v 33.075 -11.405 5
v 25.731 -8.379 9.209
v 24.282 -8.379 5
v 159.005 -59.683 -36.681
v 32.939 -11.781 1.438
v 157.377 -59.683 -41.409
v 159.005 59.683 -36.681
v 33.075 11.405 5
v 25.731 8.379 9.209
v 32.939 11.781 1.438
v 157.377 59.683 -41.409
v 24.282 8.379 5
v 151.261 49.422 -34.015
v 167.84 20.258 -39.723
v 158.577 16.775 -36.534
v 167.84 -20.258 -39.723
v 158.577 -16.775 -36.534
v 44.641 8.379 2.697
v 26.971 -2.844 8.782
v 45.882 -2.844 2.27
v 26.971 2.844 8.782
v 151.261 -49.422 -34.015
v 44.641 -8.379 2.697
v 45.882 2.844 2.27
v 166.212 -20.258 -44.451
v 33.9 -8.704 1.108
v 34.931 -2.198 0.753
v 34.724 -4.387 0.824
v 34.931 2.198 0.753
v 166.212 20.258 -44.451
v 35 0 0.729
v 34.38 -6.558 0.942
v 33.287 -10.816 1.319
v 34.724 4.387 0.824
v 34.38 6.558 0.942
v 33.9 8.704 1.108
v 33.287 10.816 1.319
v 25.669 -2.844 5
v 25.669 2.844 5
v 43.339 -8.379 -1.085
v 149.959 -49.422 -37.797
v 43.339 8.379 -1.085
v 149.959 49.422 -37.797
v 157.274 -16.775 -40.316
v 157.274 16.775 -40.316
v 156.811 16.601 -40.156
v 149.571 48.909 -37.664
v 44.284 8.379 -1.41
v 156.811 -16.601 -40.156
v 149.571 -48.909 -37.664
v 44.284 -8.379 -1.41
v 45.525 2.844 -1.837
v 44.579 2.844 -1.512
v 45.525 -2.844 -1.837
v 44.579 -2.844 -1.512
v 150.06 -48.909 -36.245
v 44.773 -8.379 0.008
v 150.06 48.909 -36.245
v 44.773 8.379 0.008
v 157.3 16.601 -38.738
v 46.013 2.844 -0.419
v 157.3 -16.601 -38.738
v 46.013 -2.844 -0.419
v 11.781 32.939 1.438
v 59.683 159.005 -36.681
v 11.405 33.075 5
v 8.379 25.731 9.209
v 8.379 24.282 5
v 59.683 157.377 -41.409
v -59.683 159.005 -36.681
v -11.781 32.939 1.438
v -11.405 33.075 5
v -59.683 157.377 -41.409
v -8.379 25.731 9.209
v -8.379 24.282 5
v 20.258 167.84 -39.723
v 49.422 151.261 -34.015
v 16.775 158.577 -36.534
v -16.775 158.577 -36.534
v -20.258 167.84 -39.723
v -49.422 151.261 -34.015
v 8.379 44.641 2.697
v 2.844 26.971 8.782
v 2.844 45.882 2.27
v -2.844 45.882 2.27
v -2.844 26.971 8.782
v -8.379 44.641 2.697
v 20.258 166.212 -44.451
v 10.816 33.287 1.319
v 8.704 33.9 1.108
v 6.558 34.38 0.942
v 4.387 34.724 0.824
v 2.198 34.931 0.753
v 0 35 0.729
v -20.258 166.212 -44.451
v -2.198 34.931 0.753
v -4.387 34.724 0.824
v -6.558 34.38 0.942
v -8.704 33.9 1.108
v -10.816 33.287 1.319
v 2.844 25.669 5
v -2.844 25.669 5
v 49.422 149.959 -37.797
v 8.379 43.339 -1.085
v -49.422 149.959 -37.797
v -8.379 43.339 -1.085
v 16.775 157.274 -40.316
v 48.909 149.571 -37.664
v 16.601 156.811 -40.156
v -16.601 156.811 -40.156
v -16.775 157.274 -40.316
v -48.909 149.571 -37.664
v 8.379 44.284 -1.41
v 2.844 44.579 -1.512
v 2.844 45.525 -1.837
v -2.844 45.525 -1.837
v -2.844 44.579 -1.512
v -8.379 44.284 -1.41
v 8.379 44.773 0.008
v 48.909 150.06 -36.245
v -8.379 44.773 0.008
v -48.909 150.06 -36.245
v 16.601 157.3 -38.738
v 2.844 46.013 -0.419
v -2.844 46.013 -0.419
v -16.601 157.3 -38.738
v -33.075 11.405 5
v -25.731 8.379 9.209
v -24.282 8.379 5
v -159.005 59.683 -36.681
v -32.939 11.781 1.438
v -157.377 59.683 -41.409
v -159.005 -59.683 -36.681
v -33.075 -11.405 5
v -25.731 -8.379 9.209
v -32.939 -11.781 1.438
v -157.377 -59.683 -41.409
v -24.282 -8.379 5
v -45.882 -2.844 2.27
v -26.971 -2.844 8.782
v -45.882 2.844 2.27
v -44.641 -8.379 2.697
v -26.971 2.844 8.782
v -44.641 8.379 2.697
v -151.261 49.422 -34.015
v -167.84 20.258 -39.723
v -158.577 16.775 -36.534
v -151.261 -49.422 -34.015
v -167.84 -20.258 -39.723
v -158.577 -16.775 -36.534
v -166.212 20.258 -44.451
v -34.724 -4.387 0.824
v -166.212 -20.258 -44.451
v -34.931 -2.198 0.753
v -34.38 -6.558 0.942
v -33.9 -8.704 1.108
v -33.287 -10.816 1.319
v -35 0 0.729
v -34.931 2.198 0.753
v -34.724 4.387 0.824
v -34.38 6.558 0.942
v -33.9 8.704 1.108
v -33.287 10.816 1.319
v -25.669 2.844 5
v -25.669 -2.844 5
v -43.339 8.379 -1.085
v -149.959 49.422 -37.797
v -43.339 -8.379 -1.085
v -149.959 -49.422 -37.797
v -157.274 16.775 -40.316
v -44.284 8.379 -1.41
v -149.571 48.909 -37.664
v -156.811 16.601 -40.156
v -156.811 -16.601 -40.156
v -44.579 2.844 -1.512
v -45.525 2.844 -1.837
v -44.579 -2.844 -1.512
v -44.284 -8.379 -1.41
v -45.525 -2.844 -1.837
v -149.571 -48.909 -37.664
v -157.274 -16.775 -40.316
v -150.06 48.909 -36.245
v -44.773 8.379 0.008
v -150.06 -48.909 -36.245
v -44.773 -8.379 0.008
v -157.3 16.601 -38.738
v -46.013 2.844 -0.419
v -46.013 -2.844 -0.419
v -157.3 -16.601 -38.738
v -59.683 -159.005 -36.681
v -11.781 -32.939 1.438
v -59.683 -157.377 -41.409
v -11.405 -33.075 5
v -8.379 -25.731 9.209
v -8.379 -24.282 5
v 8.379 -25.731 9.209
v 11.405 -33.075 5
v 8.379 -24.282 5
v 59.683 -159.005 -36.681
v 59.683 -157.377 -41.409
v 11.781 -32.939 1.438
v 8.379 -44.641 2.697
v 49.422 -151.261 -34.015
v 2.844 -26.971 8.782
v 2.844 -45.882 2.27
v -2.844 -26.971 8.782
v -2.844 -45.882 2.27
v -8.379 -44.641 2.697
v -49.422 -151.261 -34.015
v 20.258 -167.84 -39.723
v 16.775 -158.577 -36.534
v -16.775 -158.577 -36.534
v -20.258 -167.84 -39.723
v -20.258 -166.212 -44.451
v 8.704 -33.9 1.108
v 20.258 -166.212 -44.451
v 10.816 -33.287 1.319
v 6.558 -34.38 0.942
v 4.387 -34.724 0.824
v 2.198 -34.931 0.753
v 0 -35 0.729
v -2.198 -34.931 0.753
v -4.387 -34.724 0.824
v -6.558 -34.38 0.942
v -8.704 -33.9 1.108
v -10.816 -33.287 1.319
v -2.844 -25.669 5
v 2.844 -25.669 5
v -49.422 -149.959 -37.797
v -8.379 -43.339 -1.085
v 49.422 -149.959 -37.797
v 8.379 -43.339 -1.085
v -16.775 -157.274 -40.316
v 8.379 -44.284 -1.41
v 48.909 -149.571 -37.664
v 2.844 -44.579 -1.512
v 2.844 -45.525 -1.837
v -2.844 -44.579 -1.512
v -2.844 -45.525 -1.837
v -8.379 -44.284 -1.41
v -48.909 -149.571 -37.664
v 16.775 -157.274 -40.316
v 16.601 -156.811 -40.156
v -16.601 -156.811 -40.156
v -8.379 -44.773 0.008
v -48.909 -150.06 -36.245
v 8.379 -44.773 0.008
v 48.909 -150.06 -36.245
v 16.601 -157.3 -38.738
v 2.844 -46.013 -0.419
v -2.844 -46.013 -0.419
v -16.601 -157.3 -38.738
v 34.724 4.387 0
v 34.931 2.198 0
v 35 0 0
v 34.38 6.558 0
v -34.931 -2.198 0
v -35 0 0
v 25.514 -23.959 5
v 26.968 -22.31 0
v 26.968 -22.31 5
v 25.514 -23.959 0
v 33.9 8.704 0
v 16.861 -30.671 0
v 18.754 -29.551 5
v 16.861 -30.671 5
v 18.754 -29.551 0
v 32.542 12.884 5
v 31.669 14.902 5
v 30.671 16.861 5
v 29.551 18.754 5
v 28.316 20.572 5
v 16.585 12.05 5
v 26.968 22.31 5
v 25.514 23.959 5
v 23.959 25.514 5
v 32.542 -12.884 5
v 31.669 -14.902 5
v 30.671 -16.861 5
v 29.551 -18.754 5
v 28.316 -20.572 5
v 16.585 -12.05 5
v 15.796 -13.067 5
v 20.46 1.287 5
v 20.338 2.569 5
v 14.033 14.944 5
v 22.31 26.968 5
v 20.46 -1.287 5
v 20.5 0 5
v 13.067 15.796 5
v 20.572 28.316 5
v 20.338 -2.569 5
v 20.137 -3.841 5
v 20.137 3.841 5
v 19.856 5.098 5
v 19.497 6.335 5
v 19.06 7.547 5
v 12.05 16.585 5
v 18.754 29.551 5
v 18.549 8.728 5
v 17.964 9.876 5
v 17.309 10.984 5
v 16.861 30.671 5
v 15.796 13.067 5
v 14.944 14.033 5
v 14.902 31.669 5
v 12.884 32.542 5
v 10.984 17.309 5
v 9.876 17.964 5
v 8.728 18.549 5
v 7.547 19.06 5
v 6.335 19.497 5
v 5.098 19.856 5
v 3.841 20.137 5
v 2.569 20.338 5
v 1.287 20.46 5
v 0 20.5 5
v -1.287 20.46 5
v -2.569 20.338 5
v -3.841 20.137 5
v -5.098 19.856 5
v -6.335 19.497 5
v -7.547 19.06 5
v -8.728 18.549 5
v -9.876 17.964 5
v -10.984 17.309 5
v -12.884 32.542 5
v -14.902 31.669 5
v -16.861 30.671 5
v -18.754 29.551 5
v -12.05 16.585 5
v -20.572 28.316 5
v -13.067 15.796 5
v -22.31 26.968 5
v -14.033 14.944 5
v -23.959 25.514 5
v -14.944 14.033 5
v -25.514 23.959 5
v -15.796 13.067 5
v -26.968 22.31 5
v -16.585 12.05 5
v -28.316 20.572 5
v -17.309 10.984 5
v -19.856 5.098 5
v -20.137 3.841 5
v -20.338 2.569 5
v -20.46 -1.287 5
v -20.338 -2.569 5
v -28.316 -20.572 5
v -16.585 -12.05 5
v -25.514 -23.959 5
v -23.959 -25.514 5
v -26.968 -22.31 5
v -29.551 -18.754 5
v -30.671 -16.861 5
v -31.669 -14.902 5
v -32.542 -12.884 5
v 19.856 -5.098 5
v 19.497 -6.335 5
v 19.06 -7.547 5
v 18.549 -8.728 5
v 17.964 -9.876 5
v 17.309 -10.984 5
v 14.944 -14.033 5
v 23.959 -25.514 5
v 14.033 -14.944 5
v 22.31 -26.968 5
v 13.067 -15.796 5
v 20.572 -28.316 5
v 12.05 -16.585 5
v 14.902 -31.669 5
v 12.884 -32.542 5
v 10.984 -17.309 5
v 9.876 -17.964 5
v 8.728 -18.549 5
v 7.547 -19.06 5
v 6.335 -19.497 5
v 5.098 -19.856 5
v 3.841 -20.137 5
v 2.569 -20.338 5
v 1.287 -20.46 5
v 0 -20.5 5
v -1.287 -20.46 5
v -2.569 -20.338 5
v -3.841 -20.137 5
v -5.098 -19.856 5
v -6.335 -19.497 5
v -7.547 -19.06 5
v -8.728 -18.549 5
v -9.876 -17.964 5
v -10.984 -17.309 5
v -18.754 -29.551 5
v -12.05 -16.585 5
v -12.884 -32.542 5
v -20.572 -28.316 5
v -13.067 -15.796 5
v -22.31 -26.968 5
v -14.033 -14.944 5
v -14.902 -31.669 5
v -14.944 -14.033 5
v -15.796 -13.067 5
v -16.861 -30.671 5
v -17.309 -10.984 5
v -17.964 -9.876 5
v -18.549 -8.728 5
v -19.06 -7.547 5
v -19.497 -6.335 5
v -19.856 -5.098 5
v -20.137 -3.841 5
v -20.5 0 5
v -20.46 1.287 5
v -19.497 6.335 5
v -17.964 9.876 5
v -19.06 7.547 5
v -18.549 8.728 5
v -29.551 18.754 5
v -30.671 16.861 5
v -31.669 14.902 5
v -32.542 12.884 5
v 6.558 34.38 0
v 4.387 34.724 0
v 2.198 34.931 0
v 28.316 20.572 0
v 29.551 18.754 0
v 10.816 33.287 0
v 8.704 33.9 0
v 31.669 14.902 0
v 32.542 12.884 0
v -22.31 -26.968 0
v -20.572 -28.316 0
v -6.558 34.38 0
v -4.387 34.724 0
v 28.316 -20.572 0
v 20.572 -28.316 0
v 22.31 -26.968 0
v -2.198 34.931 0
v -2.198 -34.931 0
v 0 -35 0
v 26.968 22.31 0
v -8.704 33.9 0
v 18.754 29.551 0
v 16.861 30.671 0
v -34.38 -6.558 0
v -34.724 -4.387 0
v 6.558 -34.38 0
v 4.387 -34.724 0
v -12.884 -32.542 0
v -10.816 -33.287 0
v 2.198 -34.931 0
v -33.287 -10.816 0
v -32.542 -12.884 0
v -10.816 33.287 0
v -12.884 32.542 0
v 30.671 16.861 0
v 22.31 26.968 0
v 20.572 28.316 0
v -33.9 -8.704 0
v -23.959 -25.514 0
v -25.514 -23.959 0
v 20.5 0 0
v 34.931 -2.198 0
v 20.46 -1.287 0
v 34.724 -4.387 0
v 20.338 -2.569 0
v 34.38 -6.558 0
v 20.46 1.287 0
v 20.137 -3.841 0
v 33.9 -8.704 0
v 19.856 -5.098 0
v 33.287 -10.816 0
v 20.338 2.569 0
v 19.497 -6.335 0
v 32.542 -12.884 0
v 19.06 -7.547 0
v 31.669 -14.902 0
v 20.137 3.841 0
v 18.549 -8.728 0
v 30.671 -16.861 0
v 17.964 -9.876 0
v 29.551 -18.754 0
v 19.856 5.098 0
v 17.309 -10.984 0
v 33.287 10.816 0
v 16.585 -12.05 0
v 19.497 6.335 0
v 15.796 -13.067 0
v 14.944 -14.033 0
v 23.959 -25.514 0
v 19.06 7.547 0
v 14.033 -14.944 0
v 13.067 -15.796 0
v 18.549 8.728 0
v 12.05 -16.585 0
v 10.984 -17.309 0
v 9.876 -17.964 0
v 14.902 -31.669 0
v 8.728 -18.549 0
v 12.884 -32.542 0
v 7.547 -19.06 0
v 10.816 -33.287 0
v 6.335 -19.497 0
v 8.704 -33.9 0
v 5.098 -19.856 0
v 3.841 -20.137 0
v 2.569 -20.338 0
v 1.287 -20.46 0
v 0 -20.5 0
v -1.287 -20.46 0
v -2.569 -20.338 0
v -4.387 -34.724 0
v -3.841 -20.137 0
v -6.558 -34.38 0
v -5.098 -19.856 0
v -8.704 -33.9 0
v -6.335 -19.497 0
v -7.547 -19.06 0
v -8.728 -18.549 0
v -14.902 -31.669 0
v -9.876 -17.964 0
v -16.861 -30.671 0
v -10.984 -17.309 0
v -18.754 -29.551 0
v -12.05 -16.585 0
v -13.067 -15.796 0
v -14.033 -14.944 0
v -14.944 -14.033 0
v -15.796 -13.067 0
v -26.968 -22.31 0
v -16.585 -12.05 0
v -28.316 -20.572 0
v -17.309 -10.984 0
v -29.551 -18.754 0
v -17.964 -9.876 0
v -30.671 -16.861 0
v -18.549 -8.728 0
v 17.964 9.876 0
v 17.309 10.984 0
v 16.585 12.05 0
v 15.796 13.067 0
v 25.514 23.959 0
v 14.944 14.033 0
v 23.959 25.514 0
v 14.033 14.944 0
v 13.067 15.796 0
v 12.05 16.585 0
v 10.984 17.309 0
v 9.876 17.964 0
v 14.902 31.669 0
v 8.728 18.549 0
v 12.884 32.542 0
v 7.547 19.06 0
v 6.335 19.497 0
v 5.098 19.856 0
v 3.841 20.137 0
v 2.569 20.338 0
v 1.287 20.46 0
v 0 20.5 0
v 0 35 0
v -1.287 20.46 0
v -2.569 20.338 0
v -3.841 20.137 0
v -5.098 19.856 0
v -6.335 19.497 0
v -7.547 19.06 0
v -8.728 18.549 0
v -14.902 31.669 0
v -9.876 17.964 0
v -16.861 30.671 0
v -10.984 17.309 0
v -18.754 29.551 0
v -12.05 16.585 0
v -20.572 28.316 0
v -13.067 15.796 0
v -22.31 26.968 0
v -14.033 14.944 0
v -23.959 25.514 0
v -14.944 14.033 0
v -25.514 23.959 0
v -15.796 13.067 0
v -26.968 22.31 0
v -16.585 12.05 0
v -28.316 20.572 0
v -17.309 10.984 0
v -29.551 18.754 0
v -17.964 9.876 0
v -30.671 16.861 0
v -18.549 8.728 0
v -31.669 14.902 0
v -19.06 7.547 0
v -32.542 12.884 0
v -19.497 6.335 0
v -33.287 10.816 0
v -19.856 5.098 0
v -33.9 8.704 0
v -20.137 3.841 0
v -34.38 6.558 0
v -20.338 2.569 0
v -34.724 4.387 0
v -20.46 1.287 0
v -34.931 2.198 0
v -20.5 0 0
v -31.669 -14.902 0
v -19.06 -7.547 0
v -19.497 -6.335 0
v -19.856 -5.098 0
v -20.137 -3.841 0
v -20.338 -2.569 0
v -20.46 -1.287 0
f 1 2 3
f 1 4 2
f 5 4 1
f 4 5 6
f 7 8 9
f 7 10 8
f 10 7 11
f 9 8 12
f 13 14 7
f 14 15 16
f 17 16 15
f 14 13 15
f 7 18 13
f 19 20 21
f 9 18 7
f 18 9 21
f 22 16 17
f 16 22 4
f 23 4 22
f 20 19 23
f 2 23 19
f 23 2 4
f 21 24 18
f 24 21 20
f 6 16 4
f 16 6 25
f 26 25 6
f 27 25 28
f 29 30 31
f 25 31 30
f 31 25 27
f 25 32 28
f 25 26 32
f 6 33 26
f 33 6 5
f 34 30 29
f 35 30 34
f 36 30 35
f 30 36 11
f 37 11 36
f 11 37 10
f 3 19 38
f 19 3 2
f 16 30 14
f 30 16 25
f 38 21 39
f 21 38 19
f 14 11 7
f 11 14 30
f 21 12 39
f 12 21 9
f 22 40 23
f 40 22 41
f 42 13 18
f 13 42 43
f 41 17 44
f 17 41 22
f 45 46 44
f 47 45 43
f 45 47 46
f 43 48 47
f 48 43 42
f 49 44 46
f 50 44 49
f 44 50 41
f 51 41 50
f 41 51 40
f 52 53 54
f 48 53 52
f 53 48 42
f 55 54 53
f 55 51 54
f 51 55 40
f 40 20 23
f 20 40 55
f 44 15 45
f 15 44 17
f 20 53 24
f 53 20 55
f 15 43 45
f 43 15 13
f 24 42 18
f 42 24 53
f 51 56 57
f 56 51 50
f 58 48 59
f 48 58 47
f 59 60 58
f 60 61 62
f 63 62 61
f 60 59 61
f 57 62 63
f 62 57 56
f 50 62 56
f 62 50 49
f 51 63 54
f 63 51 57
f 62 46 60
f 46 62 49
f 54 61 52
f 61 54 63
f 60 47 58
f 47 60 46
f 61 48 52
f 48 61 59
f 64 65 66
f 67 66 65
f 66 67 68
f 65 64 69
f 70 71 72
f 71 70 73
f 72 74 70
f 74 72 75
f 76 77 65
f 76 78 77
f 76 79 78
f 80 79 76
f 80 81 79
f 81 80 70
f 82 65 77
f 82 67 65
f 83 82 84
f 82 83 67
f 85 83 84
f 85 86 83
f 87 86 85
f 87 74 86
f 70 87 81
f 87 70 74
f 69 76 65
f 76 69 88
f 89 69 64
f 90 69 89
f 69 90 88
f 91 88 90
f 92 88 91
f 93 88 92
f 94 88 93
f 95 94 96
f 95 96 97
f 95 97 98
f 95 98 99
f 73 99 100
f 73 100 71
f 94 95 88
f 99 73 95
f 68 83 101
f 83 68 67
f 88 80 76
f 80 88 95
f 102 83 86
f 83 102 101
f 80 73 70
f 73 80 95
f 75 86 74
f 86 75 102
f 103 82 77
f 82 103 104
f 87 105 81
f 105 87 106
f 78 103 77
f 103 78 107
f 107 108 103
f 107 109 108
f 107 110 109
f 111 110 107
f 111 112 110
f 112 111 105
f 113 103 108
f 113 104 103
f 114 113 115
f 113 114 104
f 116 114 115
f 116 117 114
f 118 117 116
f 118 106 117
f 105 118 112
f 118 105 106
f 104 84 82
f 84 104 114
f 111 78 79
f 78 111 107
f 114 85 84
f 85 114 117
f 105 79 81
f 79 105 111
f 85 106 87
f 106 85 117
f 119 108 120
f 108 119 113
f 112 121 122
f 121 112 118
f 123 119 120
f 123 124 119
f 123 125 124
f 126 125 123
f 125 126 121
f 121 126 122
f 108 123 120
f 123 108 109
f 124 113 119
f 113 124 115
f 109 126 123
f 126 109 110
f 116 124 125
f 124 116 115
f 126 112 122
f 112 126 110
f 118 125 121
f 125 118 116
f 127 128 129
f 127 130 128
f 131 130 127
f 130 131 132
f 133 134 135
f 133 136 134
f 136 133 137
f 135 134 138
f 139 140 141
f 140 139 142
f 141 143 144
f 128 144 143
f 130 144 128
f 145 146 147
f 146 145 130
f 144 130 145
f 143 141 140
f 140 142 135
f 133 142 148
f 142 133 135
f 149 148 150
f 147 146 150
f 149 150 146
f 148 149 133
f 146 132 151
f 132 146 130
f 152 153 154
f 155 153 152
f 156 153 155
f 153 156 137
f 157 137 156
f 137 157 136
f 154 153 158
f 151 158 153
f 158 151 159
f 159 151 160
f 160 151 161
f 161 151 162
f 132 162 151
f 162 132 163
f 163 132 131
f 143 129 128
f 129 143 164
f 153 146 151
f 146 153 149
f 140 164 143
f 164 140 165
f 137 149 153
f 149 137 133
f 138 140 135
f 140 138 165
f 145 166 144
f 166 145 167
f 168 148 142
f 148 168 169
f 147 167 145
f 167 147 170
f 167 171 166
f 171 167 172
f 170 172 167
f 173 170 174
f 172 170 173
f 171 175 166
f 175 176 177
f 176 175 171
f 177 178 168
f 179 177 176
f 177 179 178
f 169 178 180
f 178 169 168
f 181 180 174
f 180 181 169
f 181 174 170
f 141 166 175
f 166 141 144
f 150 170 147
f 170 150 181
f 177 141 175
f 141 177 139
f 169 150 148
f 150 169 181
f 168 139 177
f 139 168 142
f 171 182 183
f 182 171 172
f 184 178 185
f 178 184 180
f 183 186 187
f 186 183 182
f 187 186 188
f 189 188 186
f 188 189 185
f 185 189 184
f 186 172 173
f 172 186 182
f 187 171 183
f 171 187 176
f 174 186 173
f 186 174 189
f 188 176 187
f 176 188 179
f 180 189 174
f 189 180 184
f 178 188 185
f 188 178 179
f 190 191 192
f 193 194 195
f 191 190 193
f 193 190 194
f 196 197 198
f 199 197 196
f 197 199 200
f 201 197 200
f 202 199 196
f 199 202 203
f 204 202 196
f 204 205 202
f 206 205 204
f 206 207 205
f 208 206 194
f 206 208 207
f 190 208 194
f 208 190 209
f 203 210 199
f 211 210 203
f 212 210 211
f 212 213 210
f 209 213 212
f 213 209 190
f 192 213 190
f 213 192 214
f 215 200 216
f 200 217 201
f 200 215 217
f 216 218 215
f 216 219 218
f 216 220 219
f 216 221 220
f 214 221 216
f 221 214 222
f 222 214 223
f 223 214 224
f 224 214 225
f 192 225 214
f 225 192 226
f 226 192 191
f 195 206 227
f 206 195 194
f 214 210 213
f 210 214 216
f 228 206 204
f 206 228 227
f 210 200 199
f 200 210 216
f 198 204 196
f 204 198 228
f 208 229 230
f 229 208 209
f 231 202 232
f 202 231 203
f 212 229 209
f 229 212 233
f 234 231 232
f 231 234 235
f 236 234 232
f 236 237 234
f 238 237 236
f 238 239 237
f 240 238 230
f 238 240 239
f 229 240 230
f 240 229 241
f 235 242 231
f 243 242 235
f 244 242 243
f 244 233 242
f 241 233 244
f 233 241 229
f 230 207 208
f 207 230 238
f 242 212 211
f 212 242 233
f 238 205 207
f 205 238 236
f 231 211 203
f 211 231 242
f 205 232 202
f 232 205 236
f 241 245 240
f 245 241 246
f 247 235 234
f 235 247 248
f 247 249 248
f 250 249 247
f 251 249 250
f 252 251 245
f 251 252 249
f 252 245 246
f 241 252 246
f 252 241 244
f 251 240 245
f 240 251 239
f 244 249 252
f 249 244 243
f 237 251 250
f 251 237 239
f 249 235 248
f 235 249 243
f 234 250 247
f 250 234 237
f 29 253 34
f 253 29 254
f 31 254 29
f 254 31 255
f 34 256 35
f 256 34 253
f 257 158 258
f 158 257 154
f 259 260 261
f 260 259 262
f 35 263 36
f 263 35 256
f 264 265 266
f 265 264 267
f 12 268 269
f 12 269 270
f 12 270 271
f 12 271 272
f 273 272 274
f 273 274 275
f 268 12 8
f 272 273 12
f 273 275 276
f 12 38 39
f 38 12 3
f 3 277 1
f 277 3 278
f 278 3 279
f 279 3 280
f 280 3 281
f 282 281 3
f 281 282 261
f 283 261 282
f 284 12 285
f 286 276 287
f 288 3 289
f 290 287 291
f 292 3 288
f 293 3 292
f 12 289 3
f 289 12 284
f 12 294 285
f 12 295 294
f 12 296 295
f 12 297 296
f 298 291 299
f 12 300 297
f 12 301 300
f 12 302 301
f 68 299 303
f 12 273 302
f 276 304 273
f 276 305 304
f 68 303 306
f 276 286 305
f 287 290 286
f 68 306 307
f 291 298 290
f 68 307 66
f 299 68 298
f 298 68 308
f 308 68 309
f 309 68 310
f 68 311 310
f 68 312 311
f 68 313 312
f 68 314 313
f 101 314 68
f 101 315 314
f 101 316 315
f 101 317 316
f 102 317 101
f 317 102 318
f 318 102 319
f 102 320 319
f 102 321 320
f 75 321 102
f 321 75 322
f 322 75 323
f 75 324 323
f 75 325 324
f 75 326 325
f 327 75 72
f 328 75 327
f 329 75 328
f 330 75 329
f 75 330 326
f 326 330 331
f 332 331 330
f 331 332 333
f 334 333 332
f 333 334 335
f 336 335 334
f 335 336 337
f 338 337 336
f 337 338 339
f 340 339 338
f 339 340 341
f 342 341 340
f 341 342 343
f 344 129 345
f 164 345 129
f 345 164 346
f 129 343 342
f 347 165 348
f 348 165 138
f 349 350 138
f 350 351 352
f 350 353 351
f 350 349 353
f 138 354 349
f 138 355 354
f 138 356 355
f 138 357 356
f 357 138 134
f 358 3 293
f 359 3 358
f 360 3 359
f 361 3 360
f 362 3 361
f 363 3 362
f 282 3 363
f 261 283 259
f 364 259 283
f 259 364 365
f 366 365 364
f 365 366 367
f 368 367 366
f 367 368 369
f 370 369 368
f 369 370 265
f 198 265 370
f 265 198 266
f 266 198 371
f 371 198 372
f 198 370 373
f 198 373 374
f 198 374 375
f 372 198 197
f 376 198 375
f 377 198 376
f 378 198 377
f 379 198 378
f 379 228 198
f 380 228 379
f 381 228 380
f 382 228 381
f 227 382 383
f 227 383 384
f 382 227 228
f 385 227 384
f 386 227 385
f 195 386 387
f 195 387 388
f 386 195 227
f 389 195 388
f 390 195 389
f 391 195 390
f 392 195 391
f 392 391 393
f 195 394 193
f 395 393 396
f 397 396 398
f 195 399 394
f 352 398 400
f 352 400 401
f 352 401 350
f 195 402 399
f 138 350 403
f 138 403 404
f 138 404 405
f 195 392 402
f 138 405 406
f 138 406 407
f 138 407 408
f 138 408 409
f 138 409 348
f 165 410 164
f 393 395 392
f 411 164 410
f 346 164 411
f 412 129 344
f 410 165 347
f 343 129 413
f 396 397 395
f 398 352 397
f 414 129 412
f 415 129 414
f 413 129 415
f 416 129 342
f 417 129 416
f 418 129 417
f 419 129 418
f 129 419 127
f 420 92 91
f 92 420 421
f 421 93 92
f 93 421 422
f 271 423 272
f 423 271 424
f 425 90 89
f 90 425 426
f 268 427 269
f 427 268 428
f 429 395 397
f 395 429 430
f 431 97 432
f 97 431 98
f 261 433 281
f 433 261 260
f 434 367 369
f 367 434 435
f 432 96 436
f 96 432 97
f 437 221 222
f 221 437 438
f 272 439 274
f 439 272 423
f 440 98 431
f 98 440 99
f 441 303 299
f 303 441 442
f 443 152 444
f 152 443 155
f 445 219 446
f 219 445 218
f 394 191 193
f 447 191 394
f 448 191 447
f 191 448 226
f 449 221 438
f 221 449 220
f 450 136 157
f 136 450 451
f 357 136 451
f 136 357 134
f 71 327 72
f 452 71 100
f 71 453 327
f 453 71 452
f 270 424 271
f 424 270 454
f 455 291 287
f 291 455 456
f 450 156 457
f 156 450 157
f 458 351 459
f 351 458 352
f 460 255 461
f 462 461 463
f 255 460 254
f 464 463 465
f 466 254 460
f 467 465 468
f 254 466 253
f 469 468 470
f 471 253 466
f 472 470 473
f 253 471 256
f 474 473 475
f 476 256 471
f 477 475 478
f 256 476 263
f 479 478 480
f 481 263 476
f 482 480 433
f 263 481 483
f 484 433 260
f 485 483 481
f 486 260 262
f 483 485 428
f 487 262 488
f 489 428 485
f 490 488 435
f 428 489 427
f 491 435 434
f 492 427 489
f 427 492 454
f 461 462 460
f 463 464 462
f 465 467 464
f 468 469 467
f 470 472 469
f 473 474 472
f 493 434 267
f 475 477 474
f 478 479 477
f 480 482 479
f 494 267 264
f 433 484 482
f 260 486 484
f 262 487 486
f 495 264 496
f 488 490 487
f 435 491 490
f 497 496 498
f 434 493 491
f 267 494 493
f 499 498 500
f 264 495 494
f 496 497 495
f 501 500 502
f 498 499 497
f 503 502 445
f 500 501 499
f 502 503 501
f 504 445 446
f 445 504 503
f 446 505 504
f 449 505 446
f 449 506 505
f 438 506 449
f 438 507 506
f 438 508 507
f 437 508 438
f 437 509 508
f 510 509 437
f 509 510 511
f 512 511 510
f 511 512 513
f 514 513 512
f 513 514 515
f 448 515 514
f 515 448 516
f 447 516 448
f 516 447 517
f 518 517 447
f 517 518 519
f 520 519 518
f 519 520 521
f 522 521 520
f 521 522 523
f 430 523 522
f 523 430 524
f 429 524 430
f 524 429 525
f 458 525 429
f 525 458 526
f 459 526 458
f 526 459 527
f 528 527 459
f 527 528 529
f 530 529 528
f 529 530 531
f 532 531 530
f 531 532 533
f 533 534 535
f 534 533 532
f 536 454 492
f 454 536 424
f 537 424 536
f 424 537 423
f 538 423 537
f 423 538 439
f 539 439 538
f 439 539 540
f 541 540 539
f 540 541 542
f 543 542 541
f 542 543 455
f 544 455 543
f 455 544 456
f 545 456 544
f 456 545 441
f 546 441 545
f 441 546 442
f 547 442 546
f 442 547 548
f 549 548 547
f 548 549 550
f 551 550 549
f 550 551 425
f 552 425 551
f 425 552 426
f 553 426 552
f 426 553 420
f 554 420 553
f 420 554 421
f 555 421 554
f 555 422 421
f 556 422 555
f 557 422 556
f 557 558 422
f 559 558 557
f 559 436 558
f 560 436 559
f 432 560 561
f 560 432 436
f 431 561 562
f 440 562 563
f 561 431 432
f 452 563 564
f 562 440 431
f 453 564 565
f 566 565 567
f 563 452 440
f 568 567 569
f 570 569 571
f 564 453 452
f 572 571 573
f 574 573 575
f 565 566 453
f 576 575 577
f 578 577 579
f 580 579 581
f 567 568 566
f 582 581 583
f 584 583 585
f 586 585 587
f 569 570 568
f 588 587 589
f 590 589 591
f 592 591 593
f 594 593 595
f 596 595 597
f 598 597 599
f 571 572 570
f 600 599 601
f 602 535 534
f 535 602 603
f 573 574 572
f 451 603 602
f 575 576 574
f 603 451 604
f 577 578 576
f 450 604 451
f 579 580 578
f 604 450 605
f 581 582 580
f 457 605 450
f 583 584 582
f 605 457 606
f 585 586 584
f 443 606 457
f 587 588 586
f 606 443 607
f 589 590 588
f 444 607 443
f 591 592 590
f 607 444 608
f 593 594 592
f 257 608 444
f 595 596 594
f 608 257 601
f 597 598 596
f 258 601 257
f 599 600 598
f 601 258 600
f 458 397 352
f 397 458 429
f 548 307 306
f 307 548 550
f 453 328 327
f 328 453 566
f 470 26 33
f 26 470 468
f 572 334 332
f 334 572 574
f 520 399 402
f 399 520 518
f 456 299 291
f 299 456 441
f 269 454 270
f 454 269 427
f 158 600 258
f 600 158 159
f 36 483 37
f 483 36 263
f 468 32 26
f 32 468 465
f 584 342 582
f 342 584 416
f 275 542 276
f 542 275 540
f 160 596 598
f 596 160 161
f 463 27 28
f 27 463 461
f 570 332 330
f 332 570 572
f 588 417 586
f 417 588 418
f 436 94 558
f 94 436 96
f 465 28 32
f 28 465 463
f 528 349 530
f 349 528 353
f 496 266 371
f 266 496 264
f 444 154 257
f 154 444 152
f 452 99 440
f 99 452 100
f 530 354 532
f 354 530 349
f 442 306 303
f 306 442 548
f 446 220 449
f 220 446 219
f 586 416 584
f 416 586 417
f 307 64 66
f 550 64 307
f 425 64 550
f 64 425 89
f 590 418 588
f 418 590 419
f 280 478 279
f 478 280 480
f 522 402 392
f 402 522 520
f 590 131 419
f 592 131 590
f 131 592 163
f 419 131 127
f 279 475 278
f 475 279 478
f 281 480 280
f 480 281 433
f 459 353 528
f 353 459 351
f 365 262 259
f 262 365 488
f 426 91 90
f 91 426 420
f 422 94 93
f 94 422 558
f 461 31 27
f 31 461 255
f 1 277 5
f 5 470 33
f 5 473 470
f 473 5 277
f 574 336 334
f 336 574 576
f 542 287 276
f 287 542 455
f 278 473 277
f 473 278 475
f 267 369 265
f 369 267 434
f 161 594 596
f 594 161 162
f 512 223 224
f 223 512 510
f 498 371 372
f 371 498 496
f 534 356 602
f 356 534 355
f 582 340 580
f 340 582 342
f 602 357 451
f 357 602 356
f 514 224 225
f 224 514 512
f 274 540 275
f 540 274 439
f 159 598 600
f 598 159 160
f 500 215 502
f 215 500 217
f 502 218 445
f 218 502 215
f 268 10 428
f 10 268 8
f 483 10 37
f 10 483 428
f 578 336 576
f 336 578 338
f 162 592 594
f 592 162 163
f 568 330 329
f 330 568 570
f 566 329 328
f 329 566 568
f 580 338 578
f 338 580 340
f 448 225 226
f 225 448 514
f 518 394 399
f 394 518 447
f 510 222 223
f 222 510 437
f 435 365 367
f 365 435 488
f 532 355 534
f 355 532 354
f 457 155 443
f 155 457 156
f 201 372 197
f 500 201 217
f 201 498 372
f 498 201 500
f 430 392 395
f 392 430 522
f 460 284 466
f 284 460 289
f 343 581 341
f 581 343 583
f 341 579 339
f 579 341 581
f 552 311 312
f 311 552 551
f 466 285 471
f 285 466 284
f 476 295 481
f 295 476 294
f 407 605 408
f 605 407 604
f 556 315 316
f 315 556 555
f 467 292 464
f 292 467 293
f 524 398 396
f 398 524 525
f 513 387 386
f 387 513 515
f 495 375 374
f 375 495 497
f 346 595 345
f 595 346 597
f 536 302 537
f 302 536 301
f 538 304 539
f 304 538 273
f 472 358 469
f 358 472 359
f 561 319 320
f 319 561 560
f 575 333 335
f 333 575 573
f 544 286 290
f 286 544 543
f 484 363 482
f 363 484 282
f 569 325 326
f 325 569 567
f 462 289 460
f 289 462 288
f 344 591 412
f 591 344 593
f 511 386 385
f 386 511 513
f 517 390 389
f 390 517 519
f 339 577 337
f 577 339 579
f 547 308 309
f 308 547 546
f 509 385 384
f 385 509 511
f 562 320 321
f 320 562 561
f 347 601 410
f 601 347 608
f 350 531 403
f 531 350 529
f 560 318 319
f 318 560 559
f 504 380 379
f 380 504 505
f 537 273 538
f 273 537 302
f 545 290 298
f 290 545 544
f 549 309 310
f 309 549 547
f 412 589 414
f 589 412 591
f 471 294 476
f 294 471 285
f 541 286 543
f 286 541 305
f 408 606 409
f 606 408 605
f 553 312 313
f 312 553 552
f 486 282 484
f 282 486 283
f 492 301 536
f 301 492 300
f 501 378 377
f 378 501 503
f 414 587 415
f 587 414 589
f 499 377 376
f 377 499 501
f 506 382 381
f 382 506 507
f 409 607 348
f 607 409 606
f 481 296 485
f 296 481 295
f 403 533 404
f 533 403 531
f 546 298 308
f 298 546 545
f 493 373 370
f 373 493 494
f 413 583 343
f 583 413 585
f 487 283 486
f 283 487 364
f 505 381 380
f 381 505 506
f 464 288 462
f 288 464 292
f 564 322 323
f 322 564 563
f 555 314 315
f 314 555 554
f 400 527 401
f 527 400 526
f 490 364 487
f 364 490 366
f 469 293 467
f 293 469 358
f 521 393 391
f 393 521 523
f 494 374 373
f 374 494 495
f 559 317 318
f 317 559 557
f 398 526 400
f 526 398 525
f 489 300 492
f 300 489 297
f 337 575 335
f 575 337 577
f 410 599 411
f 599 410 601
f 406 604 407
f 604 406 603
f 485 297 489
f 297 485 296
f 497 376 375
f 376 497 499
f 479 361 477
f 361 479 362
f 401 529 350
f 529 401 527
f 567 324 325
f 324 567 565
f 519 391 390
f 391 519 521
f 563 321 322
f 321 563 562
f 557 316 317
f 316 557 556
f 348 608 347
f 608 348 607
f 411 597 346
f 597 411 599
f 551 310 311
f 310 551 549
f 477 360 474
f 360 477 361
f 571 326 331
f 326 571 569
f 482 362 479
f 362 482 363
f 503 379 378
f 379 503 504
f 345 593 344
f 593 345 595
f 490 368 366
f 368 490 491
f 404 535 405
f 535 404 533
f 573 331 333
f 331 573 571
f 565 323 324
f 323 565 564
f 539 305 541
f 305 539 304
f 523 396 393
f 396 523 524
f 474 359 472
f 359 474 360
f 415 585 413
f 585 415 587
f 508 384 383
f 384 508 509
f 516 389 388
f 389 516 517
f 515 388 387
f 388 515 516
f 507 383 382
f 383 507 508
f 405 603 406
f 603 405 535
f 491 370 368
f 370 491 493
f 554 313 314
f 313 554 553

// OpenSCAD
reso = 100;

d_int_fix = 41;
d_ext_fix = 70;
h_fix = 5;

r_abat = 150;
d_abat = 4;
h_abat = 5;
ang_abat = 40;

ep_fen = 20;
ep_fen_int = 25;

ang_abat_fix = 19;

module fix() {
    difference() {
        cylinder(r=d_ext_fix/2, $fn=reso, h=h_fix);
        cylinder(r=d_int_fix/2, $fn=reso, h=h_fix);
        apat_complet();
    }
}

module abat_2(){
    translate([-d_abat-d_int_fix/2,0,0])rotate([0,0,-ang_abat/2])
        rotate_extrude(angle=ang_abat, convexity=10) {
            translate([d_abat+d_int_fix/2,0,0])
                square([r_abat, h_abat]);
        }   
}

module abat_fenetre(){
    translate([-d_abat+ep_fen-d_int_fix/2,0,1])rotate([0,0,-ang_abat/2])
        rotate_extrude(angle=ang_abat, convexity=10) {
            translate([d_abat+d_int_fix/2,0,0])
                square([r_abat-ep_fen*1.5, h_abat]);
        }   
}

module abat_fenetre_int(){
    translate([-d_abat+ep_fen_int-d_int_fix/2,0,0])rotate([0,0,-ang_abat/2])
        rotate_extrude(angle=ang_abat, convexity=10) {
            translate([d_abat+d_int_fix/2,0,0])
                square([r_abat-ep_fen_int*1.5, h_abat]);
        }   
}

module fenetre_int(){
    translate([-d_abat+ep_fen+1-d_int_fix/2,0,0])rotate([0,0,-ang_abat/2])
        rotate_extrude(angle=ang_abat, convexity=10) {
            translate([d_abat+d_int_fix/2,0,0])
                square([r_abat-(ep_fen+1)*1.5, h_abat/2]);
        }   
}

module abat_1() {
    difference() {
        abat_2();
        abat_fenetre();
        abat_fenetre_int();
    }
}

module abat() {
    translate([d_abat+1+d_int_fix/2,0,h_abat-1])rotate([0,ang_abat_fix,0]) {
        color("chocolate")abat_1();
        color("white")fenetre_int();
    }
    
}

module apat_complet() {
   for (a =[0:3]) {
       rotate(90*a) {
           abat();
       }
   }
}

//fenetre_int();
//abat_1();
apat_complet();
color("SaddleBrown")fix();
